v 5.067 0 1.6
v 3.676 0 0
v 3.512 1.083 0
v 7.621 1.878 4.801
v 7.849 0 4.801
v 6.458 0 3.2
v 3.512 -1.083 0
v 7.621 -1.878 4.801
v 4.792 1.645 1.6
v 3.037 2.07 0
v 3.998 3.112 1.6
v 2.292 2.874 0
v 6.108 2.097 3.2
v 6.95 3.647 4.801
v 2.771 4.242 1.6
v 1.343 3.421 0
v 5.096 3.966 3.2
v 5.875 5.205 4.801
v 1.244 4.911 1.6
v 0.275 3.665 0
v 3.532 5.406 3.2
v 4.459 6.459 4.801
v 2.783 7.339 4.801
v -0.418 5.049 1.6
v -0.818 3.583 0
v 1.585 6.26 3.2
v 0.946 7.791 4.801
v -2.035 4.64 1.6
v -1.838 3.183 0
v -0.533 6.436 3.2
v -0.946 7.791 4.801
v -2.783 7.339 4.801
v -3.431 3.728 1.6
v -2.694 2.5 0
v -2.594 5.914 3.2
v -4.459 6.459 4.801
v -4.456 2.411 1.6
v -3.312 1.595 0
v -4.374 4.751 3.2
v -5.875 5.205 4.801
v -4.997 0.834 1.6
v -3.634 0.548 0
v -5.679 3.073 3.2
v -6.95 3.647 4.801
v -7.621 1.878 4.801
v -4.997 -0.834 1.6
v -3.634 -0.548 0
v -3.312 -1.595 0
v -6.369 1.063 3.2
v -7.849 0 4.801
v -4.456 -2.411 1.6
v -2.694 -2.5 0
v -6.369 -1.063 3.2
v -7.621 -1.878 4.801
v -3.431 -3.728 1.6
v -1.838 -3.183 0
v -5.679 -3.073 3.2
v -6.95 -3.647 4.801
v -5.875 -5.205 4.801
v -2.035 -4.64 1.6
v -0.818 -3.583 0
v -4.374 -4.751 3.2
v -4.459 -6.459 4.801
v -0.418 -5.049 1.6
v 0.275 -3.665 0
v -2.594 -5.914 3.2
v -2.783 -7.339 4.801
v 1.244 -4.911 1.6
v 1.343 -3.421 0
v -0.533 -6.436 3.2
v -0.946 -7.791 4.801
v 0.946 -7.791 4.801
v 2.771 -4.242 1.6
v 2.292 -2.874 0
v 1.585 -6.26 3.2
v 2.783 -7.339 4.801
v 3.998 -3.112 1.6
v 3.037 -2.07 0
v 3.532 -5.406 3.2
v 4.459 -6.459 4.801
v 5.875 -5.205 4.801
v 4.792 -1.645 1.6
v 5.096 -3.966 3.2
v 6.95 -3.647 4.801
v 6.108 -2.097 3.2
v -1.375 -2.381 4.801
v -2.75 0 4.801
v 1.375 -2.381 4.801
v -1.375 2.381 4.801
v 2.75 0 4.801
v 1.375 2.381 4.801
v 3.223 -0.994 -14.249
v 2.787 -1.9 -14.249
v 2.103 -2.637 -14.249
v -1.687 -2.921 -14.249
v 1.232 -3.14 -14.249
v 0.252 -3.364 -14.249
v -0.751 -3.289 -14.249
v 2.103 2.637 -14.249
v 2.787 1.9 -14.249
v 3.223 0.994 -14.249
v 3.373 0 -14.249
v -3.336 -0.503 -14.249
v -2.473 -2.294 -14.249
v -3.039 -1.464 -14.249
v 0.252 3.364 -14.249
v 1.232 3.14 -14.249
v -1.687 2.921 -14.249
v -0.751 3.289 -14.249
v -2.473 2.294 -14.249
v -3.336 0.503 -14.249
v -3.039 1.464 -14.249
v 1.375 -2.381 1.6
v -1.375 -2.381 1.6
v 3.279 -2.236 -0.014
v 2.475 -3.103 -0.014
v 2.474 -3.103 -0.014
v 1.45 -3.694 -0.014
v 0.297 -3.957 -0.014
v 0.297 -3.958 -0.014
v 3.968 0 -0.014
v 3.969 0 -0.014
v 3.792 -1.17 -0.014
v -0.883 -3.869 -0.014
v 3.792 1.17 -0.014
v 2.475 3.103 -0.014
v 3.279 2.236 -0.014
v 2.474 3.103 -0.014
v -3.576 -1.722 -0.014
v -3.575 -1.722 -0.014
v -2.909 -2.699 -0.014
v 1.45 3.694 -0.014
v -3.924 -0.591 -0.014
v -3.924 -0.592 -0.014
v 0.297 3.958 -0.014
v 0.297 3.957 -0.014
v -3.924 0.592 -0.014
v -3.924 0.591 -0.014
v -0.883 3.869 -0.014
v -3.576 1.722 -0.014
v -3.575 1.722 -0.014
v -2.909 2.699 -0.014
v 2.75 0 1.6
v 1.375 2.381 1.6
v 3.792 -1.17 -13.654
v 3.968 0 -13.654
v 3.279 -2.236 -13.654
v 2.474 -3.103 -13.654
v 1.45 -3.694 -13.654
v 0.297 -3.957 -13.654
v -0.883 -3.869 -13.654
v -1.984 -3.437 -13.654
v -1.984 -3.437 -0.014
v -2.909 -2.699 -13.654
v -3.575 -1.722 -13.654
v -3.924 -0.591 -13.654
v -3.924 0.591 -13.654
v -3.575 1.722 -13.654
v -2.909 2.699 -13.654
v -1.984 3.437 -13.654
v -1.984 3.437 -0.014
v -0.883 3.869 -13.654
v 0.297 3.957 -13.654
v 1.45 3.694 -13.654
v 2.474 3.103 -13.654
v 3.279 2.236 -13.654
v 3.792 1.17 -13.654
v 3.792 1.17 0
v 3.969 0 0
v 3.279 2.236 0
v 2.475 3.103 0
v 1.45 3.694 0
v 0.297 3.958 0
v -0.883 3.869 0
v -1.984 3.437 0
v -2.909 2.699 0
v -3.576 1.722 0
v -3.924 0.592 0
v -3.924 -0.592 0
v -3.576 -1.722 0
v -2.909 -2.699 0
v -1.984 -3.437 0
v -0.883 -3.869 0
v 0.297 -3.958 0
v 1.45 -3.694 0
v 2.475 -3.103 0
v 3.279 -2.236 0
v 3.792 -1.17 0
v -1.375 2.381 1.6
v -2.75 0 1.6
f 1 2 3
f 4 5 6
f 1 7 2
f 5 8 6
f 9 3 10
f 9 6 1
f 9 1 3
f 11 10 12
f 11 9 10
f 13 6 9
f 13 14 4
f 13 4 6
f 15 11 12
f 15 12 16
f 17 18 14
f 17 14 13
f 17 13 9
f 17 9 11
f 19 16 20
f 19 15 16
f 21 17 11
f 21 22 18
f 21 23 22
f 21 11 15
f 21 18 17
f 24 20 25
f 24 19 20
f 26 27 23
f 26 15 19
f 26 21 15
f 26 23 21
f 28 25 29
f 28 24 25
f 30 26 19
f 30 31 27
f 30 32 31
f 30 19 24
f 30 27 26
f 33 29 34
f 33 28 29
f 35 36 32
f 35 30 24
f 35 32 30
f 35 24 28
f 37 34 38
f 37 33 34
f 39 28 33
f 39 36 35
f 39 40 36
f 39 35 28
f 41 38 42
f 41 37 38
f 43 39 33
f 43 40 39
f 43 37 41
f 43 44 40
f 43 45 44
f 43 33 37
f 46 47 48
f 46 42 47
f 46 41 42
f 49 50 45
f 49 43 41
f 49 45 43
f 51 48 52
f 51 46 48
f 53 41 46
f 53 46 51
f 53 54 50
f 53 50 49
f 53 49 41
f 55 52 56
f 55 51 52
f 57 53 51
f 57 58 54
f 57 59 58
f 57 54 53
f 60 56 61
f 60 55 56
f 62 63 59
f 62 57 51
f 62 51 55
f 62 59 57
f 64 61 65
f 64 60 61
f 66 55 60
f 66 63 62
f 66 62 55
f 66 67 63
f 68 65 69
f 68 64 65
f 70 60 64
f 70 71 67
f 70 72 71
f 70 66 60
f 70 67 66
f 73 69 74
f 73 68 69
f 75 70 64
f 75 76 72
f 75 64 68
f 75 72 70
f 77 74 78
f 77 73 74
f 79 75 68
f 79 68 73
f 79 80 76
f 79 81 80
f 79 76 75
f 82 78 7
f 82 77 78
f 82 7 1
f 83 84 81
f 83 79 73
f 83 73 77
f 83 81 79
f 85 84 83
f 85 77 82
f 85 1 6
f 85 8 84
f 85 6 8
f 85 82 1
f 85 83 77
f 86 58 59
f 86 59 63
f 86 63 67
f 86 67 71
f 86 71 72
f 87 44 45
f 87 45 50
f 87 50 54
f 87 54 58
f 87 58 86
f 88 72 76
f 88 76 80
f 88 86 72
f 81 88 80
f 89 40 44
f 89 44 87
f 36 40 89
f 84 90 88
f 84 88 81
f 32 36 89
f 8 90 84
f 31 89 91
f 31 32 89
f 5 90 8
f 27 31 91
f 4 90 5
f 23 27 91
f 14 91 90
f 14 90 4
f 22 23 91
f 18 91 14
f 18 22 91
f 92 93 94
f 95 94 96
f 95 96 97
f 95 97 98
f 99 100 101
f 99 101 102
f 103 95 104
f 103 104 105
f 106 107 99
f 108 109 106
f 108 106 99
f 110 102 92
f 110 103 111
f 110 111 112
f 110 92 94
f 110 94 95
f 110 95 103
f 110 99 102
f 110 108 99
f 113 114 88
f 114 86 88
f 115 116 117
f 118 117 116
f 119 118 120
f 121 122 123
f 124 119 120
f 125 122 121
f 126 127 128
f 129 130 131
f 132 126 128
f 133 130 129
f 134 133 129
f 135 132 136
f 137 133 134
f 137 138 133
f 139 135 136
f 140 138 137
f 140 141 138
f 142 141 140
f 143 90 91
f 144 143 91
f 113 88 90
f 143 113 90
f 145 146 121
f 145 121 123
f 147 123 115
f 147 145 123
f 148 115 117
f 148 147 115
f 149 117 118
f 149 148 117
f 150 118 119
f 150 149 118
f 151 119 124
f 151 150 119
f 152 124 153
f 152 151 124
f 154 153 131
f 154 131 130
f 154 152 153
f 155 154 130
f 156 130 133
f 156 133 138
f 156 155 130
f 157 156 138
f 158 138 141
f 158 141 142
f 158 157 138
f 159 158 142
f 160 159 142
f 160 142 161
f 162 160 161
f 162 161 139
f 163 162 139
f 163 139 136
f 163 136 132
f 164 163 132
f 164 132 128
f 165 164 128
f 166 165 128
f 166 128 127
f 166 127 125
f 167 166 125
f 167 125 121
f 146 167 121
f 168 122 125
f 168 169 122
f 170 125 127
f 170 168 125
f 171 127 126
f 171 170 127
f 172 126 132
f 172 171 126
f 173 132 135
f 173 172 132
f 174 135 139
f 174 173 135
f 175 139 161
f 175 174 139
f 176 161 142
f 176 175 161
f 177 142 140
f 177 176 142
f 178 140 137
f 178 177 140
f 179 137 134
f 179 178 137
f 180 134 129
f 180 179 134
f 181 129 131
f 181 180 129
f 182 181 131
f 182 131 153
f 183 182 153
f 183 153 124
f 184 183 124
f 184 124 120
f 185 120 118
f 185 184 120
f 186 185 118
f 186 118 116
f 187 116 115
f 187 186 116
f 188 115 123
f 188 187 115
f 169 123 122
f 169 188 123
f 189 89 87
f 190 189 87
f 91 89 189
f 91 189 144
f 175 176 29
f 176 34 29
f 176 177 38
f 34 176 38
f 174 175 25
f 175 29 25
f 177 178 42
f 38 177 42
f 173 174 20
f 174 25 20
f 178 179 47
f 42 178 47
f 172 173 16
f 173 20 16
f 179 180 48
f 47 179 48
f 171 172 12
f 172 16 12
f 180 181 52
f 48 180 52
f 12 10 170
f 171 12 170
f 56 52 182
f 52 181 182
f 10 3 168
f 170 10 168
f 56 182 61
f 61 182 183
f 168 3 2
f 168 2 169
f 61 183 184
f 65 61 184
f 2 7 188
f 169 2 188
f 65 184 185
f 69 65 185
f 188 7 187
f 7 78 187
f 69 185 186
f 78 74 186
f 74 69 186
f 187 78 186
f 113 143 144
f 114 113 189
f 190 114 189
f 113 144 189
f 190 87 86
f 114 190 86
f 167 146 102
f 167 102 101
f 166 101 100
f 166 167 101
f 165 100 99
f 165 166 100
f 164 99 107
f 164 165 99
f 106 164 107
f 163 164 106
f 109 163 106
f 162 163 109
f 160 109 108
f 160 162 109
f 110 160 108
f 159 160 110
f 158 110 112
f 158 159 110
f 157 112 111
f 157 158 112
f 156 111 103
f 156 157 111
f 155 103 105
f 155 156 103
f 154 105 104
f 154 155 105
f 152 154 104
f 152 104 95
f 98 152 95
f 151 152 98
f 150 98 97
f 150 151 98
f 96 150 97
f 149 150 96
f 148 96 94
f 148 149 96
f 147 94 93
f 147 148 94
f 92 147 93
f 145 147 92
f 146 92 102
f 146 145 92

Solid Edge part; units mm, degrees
sketch "Sketch1" plane through (0, 0, 0) normal (0, 0, 1) x (1, 0, 0)
  circle A0 centre (0, 0) radius 7.8486
  dimension "D1" = 15.6972
extrude "Protrusion1" add sketch "Sketch1" along normal blind 4.8006
sketch "Sketch2" plane through (0, 0, 0) normal (0, 0, -1) x (1, 0, 0)
  circle A0 centre (0, 0) radius 3.9688
extrude "Protrusion2" add sketch "Sketch2" along normal blind 14.2494
sketch "Sketch3" plane through (0, 0, -14.2494) normal (0, 0, -1) x (1, 0, 0)
  circle A0 centre (0, 0) radius 3.9685
extrude "Cutout1" cut sketch "Sketch3" against normal blind 14.2352 flip side to cut
chamfer "Chamfer_1" distance 0.5953 angle 45 1 edges at (-3.9685, 0, -14.2494)
sketch "Sketch4" plane through (0, 0, 4.8006) normal (0, 0, 1) x (1, 0, 0)
  line L0 (-1.3748, 2.3812) -> (1.3748, 2.3812)
  line L1 (2.7496, 0) -> (1.3748, 2.3812)
  line L2 (1.3748, -2.3812) -> (2.7496, 0)
  line L3 (-1.3748, -2.3812) -> (1.3748, -2.3812)
  line L4 (-2.7496, 0) -> (-1.3748, -2.3812)
  line L5 (-1.3748, 2.3812) -> (-2.7496, 0)
  dimension "D1" = 4.7625
extrude "Cutout2" cut sketch "Sketch4" against normal blind 3.2004
sketch "Sketch5" plane through (0, 0, 0) normal (0, -1, 0) x (1, 0, 0)
  line L0 (7.8486, 4.8006) -> (3.6755, 0)
  line L1 (3.6755, 0) -> (7.8486, 0)
  line L2 (7.8486, 0) -> (7.8486, 4.8006)
revolve "RevolvedCutout1" cut sketch "Sketch5" angle 360 about axis through (0, 0, 14.0017) along (0, 0, -1)
properties part number "24101007"
